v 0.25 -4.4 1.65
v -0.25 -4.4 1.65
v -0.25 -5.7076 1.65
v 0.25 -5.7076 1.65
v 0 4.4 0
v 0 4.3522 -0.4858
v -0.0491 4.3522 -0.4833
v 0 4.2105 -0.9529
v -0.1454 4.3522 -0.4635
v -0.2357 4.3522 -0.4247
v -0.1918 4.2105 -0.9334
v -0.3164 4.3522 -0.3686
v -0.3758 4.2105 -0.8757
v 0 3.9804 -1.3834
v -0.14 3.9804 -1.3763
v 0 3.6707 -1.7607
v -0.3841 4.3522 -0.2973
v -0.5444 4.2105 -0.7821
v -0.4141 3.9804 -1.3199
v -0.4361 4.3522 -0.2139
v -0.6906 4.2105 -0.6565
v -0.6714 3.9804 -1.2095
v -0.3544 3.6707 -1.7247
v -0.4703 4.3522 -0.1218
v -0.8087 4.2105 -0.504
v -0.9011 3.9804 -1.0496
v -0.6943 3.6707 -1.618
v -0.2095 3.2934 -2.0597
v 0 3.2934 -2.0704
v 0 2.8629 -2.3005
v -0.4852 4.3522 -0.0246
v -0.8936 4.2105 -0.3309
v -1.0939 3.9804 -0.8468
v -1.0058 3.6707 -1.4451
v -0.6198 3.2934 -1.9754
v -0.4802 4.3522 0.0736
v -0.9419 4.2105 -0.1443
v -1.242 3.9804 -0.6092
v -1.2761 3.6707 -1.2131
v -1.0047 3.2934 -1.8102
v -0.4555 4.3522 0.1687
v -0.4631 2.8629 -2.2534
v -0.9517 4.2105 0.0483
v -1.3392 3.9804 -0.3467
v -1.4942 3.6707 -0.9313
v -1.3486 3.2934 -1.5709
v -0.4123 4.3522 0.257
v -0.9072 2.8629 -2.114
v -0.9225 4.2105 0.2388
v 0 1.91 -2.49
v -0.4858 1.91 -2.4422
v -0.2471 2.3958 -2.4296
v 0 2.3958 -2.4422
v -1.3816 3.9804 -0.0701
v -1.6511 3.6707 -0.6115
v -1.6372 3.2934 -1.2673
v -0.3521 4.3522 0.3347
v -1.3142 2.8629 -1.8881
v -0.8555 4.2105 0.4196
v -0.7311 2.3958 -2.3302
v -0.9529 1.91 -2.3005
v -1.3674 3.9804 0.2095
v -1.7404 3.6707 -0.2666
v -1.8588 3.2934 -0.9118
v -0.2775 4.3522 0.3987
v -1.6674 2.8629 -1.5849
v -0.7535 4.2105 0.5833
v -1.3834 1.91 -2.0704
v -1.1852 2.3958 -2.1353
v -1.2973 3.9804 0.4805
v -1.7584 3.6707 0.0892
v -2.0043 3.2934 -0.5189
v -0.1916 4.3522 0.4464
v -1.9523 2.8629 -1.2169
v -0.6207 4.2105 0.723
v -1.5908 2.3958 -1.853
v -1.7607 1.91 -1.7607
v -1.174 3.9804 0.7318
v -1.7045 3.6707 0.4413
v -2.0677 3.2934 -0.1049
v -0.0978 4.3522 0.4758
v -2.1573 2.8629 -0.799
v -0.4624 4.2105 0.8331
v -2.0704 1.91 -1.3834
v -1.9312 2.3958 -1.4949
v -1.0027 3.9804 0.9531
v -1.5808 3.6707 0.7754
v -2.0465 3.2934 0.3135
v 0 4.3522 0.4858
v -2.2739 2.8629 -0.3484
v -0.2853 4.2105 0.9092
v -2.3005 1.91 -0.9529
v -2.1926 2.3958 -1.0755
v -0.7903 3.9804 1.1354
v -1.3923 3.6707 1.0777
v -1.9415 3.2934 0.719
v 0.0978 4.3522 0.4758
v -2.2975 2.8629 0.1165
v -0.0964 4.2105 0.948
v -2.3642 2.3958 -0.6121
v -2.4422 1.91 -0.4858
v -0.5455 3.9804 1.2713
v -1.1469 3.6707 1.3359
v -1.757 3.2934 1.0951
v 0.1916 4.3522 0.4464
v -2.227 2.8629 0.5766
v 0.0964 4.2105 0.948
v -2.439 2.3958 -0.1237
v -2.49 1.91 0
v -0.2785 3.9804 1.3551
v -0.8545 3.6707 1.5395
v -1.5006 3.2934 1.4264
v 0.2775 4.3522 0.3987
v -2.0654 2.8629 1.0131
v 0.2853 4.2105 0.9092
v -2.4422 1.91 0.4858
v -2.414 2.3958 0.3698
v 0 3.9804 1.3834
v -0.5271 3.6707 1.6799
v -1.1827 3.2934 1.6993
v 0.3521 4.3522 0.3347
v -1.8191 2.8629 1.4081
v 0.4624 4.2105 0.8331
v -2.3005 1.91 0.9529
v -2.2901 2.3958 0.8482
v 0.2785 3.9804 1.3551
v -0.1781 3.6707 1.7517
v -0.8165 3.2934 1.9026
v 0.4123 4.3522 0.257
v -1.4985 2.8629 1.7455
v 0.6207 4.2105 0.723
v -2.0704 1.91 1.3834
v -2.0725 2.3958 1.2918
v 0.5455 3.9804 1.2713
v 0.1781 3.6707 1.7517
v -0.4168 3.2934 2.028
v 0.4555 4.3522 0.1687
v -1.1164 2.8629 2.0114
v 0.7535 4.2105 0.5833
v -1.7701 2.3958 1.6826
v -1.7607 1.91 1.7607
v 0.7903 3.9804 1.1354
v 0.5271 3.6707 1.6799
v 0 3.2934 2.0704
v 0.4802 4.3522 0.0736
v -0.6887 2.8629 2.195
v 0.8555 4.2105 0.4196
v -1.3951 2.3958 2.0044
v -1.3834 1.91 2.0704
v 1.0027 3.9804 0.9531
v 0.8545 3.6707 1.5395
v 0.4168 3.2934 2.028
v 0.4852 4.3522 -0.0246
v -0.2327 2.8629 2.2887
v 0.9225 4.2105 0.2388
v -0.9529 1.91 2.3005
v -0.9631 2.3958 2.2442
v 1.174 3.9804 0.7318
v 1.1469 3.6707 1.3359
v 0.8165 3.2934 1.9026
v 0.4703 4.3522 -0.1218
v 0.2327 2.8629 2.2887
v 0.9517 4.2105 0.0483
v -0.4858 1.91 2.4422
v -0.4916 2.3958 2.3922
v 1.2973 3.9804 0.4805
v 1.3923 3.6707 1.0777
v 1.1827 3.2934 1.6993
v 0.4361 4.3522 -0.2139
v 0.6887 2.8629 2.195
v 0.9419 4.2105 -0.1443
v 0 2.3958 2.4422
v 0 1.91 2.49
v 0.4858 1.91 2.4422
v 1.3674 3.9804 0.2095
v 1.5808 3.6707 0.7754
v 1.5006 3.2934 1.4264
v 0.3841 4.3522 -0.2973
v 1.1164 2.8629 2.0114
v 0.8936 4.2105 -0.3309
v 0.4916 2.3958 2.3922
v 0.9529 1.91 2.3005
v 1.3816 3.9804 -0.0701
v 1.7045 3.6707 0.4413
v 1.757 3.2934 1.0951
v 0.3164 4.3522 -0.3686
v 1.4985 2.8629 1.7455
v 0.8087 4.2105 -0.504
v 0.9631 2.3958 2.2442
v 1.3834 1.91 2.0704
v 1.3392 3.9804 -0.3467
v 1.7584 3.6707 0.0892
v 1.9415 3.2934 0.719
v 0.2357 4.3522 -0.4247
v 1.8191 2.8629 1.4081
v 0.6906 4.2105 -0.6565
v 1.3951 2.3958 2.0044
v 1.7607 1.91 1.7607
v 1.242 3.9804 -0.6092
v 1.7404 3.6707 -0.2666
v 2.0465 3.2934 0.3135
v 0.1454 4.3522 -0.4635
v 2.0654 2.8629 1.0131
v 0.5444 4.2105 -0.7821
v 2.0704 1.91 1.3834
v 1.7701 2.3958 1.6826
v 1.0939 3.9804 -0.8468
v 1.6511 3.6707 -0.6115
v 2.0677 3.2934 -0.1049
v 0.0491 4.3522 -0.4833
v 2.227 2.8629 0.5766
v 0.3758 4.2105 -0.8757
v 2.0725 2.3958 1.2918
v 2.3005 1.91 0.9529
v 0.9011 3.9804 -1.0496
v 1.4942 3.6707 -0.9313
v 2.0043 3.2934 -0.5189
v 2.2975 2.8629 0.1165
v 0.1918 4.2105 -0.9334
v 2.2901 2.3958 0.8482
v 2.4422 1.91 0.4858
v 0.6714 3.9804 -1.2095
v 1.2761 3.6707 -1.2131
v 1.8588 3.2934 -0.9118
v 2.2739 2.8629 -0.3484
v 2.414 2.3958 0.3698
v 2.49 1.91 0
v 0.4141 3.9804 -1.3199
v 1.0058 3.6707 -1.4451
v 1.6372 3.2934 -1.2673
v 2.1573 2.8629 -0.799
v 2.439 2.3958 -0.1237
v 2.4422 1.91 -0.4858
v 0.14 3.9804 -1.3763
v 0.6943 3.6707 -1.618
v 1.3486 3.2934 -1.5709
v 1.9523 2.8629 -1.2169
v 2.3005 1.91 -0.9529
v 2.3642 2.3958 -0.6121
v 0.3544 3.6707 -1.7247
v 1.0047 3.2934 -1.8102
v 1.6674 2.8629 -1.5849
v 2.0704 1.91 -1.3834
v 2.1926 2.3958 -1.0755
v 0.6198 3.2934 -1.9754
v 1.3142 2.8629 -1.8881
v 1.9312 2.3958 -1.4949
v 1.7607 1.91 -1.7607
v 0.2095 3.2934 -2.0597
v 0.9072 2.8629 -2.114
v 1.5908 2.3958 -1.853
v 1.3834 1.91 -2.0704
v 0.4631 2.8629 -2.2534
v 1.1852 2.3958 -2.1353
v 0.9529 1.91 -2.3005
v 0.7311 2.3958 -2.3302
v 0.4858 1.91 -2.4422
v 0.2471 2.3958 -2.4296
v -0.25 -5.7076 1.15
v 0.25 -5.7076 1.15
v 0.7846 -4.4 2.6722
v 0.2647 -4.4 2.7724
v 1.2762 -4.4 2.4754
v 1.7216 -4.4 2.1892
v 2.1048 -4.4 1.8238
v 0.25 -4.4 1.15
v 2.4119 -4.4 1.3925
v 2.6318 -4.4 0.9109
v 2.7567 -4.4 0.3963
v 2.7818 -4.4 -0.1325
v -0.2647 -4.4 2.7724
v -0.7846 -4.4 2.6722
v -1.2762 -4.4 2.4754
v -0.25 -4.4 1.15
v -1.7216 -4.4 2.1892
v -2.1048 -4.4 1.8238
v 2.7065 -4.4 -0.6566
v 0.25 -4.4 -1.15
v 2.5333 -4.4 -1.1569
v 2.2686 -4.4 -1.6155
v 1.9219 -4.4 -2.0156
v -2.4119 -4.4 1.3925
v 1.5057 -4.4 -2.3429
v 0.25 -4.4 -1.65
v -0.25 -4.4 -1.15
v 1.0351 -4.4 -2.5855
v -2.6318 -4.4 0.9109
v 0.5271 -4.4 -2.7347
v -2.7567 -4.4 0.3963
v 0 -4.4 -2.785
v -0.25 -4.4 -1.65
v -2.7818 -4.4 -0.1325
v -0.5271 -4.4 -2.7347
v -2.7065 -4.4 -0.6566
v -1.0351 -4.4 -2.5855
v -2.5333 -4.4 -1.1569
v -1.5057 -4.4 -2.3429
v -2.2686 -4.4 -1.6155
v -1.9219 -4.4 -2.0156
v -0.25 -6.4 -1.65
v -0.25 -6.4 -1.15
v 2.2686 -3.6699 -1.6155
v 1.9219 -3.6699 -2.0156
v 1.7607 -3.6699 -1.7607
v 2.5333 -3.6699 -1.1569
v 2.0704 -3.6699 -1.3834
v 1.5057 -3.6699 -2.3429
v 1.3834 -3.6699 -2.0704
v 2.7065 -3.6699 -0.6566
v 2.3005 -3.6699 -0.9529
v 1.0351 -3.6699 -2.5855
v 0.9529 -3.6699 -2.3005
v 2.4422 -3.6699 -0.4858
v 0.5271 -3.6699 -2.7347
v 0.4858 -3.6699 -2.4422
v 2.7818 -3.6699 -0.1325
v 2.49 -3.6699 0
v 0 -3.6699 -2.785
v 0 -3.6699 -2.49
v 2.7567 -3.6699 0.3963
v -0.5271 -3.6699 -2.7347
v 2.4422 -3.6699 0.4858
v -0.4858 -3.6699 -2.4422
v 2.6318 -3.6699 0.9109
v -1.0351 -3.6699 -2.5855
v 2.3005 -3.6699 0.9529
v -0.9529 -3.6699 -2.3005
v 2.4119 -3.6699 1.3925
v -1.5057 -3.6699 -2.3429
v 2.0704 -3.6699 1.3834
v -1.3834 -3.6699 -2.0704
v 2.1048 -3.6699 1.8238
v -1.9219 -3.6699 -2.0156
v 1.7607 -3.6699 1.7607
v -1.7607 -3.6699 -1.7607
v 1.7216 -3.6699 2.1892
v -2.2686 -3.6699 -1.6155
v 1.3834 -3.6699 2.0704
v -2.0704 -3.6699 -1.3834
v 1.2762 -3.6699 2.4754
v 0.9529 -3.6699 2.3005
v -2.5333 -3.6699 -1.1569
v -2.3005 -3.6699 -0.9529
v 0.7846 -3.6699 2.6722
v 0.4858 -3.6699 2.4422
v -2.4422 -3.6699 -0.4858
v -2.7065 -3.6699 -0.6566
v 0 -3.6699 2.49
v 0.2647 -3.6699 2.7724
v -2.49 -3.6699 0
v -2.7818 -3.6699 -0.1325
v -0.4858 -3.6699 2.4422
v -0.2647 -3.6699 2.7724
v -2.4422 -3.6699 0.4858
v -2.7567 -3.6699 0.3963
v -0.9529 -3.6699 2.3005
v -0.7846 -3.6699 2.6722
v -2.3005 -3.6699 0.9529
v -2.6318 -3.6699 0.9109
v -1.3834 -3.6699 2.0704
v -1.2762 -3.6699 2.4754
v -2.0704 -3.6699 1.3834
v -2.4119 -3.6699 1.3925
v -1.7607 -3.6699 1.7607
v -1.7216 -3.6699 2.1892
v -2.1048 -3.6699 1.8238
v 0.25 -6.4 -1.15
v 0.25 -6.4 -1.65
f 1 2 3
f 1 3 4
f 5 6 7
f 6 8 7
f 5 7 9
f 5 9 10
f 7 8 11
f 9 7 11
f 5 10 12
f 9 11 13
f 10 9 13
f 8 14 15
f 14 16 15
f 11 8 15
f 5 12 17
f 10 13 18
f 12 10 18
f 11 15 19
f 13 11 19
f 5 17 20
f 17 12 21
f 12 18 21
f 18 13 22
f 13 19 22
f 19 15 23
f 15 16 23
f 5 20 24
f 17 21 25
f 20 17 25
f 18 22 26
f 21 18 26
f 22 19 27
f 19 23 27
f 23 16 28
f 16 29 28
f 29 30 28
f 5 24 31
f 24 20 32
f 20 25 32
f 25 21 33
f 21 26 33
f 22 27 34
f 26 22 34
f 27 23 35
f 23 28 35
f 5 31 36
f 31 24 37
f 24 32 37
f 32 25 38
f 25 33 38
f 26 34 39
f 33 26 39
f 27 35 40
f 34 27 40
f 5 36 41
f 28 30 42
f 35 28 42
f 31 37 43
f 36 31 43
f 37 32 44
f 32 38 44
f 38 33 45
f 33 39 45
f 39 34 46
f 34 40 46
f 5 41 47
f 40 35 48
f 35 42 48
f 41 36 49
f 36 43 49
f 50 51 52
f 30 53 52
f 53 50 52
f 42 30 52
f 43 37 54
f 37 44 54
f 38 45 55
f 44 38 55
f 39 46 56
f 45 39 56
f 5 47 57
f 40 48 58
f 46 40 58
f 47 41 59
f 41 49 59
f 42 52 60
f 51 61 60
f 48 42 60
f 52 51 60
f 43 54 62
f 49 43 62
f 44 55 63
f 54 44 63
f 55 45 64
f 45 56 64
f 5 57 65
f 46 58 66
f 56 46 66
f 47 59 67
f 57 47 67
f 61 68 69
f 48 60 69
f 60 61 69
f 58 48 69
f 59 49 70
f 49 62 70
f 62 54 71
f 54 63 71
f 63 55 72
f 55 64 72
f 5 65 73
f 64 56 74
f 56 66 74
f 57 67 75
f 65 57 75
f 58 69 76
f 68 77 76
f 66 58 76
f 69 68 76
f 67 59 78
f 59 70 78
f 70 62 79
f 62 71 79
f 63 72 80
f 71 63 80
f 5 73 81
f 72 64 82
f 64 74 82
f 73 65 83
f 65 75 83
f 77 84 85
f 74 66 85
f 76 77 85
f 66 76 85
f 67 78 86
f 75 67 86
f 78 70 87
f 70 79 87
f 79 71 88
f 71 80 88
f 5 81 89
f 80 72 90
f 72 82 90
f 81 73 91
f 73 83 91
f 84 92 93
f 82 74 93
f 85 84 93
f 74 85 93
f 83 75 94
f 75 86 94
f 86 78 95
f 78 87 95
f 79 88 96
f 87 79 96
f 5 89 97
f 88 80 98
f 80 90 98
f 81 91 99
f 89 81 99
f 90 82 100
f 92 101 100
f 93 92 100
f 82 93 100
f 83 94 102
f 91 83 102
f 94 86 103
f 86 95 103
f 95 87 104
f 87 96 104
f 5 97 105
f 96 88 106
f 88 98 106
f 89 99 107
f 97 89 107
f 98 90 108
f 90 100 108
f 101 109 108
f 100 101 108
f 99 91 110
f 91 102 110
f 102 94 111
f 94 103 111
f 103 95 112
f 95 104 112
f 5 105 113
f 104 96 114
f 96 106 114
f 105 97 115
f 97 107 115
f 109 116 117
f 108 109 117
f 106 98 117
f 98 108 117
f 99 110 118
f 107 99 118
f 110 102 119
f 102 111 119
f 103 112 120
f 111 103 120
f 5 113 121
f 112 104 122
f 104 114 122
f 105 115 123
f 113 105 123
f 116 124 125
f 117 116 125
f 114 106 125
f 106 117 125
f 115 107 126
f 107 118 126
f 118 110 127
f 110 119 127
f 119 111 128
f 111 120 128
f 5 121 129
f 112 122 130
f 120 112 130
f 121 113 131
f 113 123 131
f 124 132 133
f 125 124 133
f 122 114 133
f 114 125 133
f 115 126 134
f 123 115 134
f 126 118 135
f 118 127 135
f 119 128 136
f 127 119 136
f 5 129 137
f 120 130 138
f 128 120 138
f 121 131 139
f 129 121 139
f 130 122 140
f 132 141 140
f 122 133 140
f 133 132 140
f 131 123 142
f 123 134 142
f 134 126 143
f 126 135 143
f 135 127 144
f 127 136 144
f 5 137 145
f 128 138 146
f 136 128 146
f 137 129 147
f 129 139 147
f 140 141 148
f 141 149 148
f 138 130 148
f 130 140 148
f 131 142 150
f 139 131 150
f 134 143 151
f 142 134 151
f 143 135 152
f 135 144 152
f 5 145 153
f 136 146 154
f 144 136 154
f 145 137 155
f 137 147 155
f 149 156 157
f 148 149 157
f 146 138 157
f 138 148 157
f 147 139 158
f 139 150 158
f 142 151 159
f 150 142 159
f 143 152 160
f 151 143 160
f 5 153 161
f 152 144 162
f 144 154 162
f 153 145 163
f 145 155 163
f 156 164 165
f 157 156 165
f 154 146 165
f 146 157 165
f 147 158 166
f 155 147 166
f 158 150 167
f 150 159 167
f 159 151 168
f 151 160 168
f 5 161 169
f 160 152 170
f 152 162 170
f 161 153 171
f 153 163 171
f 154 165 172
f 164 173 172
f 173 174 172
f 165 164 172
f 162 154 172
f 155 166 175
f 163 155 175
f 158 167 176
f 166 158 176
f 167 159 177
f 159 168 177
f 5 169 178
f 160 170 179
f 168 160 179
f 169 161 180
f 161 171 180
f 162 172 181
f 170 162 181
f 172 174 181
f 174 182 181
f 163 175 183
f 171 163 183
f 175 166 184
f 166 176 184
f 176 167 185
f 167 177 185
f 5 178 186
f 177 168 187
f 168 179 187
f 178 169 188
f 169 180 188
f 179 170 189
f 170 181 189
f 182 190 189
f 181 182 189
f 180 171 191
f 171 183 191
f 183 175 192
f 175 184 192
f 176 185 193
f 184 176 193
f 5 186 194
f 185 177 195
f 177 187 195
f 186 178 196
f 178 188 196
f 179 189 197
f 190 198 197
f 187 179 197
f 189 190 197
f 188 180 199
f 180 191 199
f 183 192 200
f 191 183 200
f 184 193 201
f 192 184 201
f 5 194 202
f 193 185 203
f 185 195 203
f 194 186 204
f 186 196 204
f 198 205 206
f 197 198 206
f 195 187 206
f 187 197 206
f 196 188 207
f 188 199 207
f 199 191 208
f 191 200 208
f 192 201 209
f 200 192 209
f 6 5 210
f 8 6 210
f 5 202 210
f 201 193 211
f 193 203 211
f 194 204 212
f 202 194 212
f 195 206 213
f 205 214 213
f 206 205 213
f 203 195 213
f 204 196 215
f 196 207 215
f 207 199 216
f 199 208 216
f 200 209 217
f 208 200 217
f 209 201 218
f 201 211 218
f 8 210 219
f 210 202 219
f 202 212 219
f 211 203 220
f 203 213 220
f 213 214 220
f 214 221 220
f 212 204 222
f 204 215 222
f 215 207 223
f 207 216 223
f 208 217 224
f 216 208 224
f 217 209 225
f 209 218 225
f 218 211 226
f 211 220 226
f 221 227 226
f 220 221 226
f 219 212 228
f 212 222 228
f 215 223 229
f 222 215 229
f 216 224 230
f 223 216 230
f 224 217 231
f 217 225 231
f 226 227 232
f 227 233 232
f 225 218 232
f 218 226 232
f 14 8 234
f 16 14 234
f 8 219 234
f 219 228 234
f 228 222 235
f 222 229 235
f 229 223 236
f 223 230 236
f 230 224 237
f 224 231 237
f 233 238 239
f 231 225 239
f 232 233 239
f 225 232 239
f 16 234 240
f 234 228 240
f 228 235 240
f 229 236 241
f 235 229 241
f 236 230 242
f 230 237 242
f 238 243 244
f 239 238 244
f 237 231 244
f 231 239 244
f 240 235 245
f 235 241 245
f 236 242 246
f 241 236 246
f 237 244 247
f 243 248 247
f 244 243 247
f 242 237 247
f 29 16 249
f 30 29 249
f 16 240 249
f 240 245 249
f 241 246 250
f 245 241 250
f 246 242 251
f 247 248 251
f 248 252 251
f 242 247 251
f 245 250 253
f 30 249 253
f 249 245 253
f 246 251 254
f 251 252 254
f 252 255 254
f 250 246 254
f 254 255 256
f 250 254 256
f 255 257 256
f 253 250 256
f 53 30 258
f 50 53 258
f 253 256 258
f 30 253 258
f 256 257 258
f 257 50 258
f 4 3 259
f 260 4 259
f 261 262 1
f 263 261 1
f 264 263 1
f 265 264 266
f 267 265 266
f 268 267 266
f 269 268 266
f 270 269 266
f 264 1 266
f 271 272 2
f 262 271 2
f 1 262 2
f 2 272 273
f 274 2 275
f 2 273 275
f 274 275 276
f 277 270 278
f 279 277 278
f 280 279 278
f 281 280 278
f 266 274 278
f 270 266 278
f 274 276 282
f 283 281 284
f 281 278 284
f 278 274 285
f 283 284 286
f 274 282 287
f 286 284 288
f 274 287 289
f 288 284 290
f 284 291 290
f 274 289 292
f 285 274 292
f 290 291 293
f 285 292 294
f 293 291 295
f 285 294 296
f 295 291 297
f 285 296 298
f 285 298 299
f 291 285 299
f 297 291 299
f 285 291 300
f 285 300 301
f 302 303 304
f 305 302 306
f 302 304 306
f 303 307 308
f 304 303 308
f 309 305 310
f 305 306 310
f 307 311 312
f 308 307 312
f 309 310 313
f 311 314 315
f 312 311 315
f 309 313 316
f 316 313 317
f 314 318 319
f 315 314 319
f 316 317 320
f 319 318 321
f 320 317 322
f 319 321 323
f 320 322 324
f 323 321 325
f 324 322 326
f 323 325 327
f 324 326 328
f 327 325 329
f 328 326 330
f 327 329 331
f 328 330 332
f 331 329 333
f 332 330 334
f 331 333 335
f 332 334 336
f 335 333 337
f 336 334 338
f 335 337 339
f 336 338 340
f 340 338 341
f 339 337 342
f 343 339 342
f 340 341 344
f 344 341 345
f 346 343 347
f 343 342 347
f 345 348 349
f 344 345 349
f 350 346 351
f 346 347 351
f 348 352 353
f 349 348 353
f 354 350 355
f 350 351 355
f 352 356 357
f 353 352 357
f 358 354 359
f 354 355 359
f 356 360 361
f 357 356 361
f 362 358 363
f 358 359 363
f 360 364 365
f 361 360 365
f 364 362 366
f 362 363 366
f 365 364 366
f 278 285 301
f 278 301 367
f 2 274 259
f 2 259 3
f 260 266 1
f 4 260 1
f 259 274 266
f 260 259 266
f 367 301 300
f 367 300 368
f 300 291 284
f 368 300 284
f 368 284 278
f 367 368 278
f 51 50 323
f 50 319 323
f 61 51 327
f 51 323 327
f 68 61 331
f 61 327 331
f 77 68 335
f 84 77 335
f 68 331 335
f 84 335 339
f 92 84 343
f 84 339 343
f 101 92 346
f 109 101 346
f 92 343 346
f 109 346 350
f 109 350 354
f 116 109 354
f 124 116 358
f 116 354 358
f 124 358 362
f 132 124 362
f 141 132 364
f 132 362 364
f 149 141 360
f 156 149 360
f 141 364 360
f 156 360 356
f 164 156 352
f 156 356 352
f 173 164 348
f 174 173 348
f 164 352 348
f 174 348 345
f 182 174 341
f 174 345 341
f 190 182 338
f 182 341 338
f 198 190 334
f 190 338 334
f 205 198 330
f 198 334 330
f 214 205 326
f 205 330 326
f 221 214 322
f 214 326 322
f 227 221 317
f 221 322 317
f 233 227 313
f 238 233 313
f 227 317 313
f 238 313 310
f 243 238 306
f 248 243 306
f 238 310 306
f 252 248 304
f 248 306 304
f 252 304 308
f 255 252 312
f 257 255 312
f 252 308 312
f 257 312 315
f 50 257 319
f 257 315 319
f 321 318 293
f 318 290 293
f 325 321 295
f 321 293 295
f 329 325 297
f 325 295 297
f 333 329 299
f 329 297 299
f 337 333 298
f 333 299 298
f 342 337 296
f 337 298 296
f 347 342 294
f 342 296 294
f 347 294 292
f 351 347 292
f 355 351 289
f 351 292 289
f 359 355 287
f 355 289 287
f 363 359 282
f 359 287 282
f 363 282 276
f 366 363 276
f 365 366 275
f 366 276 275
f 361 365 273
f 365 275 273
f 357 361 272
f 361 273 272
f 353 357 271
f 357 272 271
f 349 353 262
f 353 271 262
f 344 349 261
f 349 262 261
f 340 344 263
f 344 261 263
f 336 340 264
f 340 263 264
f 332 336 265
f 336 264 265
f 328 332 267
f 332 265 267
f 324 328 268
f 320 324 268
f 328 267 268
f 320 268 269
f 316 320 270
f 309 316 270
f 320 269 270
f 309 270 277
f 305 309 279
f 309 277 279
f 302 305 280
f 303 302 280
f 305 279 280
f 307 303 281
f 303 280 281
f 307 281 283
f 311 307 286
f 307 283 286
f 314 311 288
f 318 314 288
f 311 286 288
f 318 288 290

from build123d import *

# Parameters (mm, degrees)
SKETCH2_W               = 0.5
SKETCH2_H               = 0.5
BOSS_EXTRUDE1_DEPTH     = 2
CUT_EXTRUDE1_DEPTH      = 8.611008475
CUT_EXTRUDE1_DEPTH_BACK = 8.611008475
SKETCH3_W               = 3.125046629
SKETCH3_H               = 2.55575519


with BuildPart() as part:
    # Sketch1 → Revolve1 (revolve)
    with BuildSketch(Plane.XY, mode=Mode.PRIVATE) as revolve1_sk:
        with BuildLine():
            Line((0, -4.4), (0, 4.4))
            ThreePointArc((0, 4.4), (1.760695885, 3.670695885), (2.49, 1.91))
            Line((2.49, 1.91), (2.49, -3.669868996))
            Line((2.49, -3.669868996), (2.785, -3.669868996))
            Line((2.785, -3.669868996), (2.785, -4.4))
            Line((2.785, -4.4), (0, -4.4))
        make_face()
    revolve(revolve1_sk.sketch.rotate(Axis((0, -4.4, 0), (0, 1, 0)), 90), axis=Axis((0, -4.4, 0), (0, 1, 0)))

    # Sketch2 → Boss-Extrude1 (add)
    with BuildSketch(Plane.XZ.offset(4.4)):
        with Locations((0, -1.4)):
            Rectangle(SKETCH2_W, SKETCH2_H)
        with Locations((0, 1.4)):
            Rectangle(SKETCH2_W, SKETCH2_H)
    extrude(amount=BOSS_EXTRUDE1_DEPTH)

    # Sketch3 → Cut-Extrude1 (cut, two sides: drawn at the far end of the back side and taken through both)
    with BuildSketch(Plane(origin=(0.25, 0, 0), x_dir=(0, 0, -1), z_dir=(1, 0, 0)).offset(-CUT_EXTRUDE1_DEPTH_BACK)):
        with Locations((-1.351312101, -6.985445416)):
            Rectangle(SKETCH3_W, SKETCH3_H)
    extrude(amount=CUT_EXTRUDE1_DEPTH + CUT_EXTRUDE1_DEPTH_BACK, mode=Mode.SUBTRACT)


solid = part.part
